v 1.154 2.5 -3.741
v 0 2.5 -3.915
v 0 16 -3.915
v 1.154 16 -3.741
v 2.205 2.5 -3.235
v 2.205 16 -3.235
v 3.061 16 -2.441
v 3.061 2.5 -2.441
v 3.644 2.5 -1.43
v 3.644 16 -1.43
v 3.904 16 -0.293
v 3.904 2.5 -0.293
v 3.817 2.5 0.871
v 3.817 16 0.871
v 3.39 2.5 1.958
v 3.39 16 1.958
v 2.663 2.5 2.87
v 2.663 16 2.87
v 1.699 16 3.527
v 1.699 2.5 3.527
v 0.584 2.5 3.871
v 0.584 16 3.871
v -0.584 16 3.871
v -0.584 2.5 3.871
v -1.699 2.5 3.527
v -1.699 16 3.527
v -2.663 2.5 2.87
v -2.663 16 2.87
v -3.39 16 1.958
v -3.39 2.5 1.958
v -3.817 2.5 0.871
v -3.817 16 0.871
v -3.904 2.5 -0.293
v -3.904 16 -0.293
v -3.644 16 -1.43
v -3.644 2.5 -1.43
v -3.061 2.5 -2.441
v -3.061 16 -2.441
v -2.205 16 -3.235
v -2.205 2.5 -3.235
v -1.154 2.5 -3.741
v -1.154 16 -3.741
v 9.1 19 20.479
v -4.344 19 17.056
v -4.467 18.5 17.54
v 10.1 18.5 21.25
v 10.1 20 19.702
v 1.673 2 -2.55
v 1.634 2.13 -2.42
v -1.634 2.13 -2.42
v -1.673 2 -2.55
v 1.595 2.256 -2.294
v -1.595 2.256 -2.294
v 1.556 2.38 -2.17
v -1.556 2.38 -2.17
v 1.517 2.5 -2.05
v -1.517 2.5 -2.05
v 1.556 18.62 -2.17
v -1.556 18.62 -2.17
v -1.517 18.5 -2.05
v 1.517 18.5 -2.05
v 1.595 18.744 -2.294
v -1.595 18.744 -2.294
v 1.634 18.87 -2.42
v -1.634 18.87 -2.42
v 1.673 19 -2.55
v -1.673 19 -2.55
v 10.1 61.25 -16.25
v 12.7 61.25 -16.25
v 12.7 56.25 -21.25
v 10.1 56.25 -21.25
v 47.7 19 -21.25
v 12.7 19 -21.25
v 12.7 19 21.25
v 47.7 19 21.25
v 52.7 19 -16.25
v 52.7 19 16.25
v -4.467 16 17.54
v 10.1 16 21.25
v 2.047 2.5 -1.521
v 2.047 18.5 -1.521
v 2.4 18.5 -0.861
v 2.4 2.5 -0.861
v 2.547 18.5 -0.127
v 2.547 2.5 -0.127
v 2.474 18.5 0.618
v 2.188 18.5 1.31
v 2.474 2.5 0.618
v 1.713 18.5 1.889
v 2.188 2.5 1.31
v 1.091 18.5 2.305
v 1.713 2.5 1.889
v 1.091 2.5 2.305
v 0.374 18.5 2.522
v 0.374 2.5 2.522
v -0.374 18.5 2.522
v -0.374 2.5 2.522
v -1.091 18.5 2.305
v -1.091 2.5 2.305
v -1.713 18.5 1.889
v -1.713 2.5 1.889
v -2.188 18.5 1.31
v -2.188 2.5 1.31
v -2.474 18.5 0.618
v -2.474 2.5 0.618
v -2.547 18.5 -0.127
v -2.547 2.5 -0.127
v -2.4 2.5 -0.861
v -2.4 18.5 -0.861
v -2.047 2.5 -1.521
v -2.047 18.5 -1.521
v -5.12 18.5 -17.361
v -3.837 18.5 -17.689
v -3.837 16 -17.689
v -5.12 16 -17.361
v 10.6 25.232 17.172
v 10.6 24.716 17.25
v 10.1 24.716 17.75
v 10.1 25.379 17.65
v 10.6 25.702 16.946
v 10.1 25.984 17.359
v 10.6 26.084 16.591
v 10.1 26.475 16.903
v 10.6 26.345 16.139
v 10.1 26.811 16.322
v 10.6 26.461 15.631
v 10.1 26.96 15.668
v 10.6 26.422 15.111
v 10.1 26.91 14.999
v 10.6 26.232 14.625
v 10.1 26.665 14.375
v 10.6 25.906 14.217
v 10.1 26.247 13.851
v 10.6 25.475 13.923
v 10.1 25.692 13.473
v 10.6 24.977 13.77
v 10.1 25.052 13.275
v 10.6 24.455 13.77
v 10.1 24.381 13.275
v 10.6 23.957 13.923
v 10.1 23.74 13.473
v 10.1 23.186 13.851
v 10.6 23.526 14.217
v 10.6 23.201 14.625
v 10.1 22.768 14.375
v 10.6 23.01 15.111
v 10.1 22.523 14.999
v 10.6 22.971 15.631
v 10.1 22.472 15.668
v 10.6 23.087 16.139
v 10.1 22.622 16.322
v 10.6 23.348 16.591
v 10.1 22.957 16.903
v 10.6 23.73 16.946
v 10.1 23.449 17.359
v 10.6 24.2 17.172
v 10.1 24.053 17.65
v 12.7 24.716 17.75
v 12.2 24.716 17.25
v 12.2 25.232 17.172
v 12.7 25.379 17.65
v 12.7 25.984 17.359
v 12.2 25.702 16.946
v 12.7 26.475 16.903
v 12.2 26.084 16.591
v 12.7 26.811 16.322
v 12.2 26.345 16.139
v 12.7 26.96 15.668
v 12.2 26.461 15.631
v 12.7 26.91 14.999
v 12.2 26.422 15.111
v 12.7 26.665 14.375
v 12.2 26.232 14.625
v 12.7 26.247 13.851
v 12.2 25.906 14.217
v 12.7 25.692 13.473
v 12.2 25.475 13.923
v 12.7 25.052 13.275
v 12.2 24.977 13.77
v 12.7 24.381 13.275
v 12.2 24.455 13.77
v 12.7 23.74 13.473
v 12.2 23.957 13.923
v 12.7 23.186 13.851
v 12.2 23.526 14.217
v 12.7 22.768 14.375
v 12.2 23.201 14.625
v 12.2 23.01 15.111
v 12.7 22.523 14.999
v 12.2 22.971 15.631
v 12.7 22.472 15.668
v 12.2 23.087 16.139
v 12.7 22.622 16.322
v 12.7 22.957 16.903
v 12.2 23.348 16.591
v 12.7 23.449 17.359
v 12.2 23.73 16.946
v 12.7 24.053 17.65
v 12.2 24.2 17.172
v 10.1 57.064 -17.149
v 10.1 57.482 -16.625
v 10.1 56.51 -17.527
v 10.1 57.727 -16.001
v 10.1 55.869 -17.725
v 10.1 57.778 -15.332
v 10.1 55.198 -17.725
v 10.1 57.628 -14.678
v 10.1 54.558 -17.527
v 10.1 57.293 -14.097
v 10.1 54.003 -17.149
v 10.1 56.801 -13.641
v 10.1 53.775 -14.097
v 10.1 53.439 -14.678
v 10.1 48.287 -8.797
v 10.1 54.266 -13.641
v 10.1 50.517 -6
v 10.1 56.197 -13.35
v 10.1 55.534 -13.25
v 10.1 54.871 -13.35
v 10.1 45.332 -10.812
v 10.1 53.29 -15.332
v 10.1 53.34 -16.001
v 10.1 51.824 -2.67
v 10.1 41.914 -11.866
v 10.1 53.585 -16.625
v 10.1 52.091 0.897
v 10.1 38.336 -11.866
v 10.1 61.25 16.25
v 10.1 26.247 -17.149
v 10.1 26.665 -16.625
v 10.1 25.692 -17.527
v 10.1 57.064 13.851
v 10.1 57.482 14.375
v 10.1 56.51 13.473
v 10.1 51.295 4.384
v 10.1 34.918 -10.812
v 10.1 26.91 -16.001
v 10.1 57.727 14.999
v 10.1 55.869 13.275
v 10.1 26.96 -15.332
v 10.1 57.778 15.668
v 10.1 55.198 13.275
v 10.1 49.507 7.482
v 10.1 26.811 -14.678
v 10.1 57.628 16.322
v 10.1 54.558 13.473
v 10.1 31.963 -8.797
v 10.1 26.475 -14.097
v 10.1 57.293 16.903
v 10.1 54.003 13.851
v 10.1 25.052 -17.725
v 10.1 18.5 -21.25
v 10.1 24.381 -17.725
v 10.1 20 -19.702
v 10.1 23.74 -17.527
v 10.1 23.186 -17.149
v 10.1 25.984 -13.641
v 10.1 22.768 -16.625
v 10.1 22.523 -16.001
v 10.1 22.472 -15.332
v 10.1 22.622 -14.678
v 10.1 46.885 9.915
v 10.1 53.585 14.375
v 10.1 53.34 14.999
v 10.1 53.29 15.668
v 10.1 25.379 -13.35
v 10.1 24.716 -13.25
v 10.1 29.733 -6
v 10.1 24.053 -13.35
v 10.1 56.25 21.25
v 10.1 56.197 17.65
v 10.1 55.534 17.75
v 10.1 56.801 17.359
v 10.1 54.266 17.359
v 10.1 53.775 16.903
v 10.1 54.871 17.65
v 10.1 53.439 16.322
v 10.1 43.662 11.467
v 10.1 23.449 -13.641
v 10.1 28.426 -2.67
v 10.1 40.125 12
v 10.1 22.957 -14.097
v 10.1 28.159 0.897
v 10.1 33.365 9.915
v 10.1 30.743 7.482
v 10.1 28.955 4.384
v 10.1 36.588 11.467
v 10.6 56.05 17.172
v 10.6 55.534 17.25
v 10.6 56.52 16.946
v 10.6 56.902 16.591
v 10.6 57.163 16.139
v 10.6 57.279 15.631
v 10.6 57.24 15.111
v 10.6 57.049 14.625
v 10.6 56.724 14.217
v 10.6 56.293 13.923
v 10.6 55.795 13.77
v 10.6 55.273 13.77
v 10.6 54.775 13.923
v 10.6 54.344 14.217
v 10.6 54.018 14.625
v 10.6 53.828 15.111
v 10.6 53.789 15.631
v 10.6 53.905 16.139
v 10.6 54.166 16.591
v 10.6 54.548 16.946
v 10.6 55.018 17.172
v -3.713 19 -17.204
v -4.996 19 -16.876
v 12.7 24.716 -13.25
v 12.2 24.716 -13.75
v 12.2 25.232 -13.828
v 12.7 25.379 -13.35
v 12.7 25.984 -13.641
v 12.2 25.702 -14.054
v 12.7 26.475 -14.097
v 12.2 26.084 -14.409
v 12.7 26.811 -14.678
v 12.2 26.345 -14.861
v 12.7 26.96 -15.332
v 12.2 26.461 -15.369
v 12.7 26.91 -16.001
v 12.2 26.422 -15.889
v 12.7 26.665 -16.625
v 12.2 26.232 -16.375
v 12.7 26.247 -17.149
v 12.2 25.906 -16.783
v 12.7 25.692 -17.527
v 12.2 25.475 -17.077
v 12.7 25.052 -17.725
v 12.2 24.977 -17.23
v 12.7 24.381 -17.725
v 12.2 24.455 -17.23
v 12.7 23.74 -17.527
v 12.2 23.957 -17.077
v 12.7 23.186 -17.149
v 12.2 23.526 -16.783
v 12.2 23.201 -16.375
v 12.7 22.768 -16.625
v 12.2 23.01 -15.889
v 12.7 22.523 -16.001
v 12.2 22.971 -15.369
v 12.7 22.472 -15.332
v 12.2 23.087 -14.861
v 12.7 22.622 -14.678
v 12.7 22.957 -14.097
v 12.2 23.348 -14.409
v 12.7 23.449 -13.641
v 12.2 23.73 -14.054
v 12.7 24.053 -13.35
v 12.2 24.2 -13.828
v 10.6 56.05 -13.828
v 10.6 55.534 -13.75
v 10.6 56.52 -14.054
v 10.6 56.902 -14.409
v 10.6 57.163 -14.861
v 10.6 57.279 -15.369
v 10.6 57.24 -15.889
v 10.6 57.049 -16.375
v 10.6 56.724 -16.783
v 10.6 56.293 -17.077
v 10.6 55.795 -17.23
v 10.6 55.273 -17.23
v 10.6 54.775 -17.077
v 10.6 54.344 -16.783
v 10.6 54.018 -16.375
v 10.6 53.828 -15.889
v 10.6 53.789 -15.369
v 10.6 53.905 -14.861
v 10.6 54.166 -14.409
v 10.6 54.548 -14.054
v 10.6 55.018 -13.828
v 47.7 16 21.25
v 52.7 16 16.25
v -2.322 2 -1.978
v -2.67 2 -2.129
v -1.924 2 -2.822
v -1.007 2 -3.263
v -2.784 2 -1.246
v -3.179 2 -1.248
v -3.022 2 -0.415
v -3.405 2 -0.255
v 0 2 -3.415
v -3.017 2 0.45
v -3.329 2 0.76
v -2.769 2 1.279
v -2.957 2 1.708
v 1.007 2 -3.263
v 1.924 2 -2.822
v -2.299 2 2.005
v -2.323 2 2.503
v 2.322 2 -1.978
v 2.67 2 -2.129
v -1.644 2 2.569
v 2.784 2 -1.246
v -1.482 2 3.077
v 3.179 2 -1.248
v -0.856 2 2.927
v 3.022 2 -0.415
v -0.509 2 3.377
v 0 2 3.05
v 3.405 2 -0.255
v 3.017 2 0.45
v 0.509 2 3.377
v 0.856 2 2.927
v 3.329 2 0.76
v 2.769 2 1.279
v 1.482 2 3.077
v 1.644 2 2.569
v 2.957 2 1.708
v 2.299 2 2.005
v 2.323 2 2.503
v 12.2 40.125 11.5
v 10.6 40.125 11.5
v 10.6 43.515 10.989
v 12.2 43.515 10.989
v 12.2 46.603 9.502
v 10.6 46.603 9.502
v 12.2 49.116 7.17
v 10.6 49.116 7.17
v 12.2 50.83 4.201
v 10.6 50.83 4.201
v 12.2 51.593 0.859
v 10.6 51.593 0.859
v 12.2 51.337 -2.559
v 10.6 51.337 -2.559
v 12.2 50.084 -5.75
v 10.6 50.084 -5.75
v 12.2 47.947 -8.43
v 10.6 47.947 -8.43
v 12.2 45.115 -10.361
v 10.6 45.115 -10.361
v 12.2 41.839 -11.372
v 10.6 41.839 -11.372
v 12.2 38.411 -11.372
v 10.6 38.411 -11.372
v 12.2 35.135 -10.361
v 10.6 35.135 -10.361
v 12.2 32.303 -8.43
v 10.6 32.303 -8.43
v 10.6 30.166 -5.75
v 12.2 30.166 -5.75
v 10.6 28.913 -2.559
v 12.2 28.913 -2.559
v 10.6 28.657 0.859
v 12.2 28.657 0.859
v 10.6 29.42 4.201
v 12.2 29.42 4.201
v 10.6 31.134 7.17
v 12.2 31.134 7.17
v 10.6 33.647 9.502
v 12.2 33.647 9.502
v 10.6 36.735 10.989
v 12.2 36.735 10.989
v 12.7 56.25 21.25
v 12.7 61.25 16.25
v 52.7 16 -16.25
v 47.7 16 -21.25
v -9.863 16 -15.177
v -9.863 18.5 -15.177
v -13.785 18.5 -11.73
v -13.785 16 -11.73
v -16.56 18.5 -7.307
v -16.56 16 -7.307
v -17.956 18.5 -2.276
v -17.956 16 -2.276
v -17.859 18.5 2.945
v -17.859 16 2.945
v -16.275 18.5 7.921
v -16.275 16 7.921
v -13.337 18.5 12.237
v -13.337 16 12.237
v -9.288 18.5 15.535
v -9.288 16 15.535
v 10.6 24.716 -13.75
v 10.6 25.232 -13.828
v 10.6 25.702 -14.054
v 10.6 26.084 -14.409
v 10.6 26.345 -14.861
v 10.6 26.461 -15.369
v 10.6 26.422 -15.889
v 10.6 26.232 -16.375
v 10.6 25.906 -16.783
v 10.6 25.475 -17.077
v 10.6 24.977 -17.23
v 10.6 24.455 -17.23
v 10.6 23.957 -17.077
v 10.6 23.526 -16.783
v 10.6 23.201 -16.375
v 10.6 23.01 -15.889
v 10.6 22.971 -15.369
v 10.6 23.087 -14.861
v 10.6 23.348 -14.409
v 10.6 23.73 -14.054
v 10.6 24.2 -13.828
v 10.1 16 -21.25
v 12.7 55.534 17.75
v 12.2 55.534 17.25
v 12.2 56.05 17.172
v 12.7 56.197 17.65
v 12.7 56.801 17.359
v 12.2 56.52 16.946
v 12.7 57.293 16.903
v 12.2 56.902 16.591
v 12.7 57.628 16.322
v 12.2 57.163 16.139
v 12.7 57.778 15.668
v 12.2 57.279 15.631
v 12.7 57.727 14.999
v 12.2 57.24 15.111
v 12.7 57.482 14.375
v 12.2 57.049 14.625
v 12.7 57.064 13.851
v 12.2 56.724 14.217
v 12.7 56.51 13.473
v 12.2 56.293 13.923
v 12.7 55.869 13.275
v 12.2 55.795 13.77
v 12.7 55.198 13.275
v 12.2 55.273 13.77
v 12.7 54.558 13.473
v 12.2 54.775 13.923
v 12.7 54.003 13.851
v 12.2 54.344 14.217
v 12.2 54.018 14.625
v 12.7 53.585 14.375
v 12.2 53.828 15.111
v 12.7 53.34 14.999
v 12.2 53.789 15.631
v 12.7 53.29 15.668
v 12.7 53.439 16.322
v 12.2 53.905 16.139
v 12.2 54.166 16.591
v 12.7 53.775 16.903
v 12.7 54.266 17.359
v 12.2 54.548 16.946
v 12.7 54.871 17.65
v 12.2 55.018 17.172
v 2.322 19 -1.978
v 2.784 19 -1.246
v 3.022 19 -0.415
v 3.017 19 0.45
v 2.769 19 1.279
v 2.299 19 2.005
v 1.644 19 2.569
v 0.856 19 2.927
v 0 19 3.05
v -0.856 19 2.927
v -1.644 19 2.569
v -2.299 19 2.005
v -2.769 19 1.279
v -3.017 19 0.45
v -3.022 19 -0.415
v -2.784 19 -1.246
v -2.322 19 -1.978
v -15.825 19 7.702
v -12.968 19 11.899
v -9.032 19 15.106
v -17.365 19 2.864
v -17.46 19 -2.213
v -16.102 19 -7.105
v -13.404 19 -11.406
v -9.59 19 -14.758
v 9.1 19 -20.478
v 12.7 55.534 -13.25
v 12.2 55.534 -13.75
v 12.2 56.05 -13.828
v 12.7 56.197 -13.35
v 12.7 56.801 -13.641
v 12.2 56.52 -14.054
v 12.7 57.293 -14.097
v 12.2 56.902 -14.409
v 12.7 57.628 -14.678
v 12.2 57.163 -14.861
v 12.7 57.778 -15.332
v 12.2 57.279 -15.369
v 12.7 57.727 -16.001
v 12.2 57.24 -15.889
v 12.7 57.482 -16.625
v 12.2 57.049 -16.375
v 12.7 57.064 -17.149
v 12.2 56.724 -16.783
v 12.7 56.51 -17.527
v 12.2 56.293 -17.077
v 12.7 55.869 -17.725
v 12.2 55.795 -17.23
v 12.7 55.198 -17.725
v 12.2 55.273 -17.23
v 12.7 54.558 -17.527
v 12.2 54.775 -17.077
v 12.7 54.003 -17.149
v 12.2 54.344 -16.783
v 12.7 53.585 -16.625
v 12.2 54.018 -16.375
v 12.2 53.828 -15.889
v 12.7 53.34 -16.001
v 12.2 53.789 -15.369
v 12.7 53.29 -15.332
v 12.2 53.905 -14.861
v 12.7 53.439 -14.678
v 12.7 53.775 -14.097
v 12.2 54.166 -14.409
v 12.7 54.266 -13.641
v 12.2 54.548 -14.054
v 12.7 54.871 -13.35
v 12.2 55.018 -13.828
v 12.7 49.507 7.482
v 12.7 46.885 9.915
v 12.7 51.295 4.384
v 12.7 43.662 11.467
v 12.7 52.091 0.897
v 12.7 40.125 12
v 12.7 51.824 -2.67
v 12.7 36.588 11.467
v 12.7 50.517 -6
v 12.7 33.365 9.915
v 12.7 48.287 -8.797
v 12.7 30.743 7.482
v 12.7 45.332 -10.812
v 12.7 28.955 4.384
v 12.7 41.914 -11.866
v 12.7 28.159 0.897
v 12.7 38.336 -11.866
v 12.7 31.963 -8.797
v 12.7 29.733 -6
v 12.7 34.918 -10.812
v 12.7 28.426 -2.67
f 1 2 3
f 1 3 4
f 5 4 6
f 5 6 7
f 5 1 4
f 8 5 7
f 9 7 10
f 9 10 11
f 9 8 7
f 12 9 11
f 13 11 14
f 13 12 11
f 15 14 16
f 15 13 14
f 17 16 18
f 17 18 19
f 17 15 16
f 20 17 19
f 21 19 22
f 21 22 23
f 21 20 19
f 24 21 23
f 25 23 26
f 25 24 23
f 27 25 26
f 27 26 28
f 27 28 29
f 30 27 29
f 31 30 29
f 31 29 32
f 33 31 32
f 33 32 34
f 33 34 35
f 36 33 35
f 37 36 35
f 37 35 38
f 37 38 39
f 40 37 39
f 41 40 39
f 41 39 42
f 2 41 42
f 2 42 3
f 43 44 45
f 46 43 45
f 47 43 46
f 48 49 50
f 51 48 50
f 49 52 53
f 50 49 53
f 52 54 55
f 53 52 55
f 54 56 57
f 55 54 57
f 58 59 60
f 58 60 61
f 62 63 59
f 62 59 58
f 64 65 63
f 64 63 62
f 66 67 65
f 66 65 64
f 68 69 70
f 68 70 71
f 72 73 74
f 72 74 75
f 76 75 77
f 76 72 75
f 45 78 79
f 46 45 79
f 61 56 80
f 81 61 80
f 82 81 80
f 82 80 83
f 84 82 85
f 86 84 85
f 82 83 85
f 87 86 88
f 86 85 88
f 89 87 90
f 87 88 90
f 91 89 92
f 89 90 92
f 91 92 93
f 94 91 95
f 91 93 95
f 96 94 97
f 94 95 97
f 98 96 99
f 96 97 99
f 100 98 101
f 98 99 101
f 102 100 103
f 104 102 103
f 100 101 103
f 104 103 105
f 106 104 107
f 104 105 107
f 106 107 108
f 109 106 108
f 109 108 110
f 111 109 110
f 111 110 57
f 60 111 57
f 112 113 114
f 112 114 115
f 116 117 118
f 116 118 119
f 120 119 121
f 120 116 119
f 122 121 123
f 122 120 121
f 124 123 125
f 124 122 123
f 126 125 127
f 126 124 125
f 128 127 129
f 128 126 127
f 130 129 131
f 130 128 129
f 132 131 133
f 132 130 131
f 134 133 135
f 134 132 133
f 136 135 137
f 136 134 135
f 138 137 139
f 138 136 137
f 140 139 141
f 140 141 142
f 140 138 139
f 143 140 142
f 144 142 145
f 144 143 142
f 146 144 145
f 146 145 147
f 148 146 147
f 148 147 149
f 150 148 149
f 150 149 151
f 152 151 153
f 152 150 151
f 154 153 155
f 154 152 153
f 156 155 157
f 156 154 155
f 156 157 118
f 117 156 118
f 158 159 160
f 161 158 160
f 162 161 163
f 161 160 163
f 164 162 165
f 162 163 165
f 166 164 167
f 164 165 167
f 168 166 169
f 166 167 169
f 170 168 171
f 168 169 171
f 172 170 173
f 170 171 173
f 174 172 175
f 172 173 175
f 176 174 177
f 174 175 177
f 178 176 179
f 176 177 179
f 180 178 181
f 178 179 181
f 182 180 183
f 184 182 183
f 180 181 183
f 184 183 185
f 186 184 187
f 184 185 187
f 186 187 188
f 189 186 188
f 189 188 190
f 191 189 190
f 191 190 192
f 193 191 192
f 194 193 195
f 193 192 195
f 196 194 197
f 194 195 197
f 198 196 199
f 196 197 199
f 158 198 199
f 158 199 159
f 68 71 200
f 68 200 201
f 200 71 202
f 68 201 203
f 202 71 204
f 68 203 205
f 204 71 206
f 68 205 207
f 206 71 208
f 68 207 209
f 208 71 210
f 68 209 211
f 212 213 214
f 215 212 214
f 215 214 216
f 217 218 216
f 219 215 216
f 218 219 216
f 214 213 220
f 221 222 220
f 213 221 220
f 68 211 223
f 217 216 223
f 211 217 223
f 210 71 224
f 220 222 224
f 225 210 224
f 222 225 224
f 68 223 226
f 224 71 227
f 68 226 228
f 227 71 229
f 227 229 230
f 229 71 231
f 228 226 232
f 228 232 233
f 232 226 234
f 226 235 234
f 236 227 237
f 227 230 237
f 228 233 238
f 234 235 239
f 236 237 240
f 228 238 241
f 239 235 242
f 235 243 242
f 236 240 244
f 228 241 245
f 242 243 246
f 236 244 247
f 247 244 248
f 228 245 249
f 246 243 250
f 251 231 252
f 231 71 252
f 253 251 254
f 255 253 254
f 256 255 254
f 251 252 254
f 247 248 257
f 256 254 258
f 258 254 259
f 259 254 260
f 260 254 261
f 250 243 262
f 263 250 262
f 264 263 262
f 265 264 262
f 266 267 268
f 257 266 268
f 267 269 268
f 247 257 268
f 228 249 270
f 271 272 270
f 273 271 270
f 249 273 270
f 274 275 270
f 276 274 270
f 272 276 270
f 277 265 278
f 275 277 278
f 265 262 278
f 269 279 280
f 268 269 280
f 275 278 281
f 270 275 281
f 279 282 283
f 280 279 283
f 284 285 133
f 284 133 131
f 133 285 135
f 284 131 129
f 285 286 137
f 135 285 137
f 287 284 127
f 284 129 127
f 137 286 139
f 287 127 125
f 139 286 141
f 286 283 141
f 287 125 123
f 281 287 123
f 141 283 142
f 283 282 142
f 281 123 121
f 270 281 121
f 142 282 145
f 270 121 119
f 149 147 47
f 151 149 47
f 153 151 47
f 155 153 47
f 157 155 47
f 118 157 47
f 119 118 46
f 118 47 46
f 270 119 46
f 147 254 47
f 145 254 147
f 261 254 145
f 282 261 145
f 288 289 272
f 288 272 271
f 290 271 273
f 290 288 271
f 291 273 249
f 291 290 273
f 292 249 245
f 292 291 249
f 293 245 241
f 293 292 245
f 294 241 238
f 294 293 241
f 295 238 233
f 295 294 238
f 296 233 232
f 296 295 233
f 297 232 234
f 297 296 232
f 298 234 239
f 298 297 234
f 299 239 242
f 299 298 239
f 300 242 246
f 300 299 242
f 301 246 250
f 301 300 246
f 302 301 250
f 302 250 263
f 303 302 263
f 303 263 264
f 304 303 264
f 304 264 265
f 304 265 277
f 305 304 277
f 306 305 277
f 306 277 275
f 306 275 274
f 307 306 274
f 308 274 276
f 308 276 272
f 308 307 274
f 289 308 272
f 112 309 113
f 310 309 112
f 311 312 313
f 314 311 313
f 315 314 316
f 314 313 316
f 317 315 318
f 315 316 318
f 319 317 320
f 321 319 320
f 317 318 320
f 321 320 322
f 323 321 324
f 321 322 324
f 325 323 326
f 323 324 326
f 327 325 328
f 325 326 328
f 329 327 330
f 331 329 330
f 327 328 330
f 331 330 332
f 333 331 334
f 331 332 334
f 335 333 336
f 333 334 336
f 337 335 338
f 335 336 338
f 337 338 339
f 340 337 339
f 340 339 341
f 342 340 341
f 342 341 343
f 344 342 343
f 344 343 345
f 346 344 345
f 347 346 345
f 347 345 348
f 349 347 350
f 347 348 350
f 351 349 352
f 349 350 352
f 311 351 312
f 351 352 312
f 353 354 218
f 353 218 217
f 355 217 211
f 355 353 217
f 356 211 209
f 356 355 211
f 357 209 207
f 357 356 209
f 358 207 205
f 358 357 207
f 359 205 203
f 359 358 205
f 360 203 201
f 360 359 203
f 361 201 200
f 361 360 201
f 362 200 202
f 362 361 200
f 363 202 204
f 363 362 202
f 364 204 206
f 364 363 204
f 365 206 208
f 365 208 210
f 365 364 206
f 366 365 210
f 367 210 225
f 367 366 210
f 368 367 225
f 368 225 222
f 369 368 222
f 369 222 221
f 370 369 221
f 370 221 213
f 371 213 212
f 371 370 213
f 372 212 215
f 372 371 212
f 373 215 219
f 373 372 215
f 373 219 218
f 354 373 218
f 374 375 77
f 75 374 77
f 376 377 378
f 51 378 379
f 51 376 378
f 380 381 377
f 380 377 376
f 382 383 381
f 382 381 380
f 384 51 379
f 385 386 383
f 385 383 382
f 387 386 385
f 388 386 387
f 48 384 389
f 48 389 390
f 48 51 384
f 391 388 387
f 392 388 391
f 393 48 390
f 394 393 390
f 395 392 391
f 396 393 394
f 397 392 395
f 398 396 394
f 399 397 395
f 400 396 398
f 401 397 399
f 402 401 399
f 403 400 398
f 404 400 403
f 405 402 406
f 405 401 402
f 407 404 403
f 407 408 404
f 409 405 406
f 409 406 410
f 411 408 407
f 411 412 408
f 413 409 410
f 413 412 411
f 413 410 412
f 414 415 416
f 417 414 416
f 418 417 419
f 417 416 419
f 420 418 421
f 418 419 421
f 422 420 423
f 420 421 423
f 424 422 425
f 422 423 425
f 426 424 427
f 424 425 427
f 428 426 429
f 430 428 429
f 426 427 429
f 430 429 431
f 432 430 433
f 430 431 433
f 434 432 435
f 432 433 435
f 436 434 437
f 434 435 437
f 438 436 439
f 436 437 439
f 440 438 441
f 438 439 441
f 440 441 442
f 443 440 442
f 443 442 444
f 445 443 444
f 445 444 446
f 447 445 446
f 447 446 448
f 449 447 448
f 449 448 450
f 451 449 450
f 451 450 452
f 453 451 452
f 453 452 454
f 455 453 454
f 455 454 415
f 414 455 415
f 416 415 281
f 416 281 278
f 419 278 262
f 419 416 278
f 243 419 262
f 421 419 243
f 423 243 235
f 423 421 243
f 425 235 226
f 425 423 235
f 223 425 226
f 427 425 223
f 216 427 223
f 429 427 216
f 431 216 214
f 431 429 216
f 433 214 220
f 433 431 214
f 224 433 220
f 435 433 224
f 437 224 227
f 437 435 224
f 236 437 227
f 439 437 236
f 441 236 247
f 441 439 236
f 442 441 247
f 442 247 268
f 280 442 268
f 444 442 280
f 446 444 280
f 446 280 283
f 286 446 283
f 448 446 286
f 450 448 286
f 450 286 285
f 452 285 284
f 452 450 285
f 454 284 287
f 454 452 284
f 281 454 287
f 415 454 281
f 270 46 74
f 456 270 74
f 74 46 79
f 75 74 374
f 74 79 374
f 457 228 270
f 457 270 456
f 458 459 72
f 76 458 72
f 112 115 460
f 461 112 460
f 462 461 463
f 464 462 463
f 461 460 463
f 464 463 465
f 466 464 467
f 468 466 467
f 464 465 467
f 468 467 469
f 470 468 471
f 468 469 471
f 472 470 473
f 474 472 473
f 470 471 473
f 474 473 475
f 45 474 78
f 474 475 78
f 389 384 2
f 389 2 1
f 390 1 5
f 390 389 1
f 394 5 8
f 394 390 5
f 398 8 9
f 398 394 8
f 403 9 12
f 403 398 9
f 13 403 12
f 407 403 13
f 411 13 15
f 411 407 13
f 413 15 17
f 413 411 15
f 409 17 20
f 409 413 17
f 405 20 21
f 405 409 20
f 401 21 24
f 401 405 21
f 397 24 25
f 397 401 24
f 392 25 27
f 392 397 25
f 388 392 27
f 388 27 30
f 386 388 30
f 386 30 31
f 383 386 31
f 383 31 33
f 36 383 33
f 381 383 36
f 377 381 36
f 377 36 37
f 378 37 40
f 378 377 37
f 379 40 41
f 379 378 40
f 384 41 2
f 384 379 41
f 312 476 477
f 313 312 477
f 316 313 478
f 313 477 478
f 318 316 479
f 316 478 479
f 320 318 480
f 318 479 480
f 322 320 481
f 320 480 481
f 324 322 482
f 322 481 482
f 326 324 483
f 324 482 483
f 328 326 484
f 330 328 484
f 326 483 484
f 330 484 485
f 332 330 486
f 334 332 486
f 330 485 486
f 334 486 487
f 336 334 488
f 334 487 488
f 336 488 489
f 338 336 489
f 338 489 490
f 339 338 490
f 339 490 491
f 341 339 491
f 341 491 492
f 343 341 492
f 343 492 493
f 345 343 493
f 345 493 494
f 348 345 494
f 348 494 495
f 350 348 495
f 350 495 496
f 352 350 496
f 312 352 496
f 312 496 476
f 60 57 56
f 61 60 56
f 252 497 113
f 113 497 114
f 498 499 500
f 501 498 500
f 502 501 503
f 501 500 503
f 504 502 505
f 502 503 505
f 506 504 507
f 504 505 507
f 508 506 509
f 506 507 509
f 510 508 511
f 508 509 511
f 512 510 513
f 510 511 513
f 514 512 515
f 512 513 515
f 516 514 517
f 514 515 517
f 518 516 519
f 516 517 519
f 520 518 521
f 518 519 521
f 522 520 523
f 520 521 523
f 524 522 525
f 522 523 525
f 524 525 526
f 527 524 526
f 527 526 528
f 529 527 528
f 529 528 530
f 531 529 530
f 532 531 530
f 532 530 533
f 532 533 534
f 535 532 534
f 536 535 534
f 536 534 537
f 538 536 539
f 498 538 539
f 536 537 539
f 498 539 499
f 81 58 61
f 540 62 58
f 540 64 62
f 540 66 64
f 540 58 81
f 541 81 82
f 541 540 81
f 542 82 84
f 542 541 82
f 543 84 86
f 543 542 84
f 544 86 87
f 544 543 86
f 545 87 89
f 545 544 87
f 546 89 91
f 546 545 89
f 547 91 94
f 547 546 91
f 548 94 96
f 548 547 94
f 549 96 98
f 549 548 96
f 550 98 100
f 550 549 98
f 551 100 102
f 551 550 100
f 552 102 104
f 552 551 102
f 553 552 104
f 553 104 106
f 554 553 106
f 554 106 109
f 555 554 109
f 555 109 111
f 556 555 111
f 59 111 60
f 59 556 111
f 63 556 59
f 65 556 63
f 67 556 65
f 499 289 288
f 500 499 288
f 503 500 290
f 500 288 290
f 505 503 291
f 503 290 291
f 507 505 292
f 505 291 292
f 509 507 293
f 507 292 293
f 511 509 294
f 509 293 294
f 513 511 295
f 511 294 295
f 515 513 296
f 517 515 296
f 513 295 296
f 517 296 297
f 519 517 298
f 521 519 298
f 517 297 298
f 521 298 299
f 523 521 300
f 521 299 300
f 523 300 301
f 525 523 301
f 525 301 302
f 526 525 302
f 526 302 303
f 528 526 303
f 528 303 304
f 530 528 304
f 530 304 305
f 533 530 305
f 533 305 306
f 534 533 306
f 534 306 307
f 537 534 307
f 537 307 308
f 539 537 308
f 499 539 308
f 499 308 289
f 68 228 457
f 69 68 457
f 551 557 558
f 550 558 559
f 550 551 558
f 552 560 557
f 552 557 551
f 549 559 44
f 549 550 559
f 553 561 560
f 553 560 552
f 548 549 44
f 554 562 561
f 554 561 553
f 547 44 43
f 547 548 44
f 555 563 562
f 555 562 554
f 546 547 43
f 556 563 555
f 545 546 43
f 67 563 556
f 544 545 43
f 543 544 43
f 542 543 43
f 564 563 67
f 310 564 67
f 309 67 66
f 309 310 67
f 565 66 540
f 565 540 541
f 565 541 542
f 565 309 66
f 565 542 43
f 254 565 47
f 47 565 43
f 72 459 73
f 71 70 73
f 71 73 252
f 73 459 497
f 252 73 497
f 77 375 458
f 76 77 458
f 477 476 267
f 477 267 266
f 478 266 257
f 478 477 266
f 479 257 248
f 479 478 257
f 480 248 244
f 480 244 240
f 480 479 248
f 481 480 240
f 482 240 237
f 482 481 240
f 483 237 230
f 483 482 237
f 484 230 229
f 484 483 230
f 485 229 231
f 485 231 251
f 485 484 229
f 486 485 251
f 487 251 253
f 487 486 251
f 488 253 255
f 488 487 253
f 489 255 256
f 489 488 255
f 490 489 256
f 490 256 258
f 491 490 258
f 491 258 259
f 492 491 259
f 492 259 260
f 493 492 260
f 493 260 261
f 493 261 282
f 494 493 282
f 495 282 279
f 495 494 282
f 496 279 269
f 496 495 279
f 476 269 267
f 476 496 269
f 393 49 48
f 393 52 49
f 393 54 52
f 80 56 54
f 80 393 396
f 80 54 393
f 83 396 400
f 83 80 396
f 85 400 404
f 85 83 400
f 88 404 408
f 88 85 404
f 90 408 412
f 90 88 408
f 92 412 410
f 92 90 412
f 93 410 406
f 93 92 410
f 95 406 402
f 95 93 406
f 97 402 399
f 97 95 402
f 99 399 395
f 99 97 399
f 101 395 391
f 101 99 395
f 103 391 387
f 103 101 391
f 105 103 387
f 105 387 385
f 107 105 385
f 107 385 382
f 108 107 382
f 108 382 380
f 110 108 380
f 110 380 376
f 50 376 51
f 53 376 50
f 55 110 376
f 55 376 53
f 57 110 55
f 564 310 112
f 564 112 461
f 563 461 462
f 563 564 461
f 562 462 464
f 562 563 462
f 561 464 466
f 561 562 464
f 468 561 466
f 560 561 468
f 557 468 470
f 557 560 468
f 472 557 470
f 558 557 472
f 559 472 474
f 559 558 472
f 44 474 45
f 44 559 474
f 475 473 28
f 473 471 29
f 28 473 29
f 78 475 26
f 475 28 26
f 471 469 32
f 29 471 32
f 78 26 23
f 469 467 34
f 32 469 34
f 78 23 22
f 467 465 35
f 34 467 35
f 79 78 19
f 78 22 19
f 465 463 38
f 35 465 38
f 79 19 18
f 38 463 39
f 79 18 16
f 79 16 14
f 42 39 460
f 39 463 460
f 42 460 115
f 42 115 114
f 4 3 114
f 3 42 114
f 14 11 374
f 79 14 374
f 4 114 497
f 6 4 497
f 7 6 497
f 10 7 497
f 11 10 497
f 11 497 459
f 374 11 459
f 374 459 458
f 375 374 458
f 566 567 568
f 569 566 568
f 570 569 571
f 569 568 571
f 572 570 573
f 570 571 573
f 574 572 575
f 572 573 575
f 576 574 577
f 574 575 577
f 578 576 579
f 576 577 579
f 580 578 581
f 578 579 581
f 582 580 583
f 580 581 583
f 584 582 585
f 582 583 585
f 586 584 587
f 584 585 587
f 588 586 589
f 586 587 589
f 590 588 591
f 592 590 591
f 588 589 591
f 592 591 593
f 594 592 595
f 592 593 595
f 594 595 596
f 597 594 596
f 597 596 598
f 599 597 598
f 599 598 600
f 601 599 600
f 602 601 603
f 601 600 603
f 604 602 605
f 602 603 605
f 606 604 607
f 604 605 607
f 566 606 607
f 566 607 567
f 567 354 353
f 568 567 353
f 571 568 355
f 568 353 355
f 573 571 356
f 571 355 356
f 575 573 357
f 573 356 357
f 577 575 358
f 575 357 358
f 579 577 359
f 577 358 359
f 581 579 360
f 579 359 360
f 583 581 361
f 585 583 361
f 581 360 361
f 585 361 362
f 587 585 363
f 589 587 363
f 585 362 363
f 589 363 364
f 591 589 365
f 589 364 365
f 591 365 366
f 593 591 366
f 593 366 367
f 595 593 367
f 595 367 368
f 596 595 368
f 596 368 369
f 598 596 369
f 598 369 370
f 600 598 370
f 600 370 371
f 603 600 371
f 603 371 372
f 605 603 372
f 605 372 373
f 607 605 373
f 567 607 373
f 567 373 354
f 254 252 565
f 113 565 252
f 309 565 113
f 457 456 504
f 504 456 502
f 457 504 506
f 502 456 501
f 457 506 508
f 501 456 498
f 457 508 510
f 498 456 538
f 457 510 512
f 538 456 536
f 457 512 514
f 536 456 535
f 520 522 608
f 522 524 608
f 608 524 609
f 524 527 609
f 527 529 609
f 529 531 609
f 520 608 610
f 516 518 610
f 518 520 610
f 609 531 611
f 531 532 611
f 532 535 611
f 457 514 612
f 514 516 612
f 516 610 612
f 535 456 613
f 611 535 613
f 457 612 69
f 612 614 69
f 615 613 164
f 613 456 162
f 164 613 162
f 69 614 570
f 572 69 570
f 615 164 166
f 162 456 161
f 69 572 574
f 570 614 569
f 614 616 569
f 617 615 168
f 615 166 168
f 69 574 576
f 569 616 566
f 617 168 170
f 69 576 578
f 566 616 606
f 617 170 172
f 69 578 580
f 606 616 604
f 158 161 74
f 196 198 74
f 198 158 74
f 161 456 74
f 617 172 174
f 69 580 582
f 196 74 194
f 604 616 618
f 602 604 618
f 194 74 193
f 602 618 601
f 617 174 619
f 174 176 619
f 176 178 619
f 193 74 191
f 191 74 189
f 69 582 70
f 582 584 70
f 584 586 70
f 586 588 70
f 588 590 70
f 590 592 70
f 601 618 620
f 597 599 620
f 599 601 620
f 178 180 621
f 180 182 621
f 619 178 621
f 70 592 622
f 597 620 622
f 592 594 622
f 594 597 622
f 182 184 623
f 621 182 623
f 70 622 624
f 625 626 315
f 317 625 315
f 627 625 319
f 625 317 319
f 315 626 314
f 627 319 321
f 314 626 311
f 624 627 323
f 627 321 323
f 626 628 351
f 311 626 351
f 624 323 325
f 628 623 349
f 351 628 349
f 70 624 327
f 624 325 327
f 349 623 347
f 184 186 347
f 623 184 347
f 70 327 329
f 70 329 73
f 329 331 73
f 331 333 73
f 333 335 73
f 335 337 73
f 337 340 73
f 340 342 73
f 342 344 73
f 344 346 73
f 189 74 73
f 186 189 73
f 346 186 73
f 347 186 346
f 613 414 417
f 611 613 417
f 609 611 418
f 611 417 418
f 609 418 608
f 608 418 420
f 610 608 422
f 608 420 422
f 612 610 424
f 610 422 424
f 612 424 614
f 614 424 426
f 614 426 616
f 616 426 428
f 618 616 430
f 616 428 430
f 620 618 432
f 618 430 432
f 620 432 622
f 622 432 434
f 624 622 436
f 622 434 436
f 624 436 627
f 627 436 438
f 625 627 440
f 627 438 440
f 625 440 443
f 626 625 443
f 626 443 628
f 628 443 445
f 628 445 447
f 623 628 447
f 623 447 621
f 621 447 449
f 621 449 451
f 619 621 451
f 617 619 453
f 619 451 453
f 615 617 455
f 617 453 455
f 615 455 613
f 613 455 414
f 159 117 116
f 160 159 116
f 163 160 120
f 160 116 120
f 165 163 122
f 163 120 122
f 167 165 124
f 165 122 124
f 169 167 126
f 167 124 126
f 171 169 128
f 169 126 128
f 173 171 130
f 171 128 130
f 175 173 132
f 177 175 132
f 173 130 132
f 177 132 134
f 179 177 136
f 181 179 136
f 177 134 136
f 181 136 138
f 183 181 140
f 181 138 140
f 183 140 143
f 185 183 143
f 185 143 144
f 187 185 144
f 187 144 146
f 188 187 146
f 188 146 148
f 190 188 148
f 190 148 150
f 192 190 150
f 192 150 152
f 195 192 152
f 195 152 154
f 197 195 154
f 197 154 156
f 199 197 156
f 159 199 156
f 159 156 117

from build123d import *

# Parameters (mm, degrees)
SKETCH_1_R          = 3.625
EXTRUDE_1_DEPTH     = 16
EXTRUDE_3_DEPTH     = 3
SKETCH_3_W          = 2.6
SKETCH_3_H          = 42.5
EXTRUDE_4_DEPTH     = 42.25
SKETCH_4_R          = 11.5
SKETCH_4_R_2        = 1.75
CUT_EXTRUDE_1_DEPTH = 42.25
EXTRUDE_5_REACH     = 85.549
SKETCH_5_R          = 3.915
SKETCH_5_R_2        = 3.625
CUT_EXTRUDE_2_REACH = 85.549
CHAMFER_1_SIZE      = 0.5
CHAMFER_2_SIZE      = 1
CHAMFER_3_SIZE      = 5
SKETCH_7_W          = 19.912738871
SKETCH_7_H          = 22.903585025
CUT_EXTRUDE_3_DEPTH = 2
CHAMFER_4_SIZE      = 0.5


with BuildPart() as part:
    # 草图1 → 凸台-拉伸1 (new body)
    with BuildSketch(Plane(origin=(0, 0, 0), x_dir=(1, 0, 0), z_dir=(0, 1, 0))):
        Circle(SKETCH_1_R)
    extrude(amount=EXTRUDE_1_DEPTH)

    # 草图2 → 凸台-拉伸3 (add)
    with BuildSketch(Plane(origin=(0, 16, 0), x_dir=(1, 0, 0), z_dir=(0, 1, 0))):
        with BuildLine():
            Line((10.1, 21.25), (-5.119556865, 17.360879514))
            ThreePointArc((-5.119556865, 17.360879514), (-18.096837592, -0.3383329), (-4.467058756, -17.540107926))
            Line((-4.467058756, -17.540107926), (10.1, -21.25))
            Line((10.1, -21.25), (52.7, -21.25))
            Line((52.7, -21.25), (52.7, 21.25))
            Line((52.7, 21.25), (10.1, 21.25))
        make_face()
    extrude(amount=EXTRUDE_3_DEPTH)

    # 草图3 → 凸台-拉伸4 (add)
    with BuildSketch(Plane(origin=(0, 19, 0), x_dir=(1, 0, 0), z_dir=(0, 1, 0))):
        with Locations((11.4, 0)):
            Rectangle(SKETCH_3_W, SKETCH_3_H)
    extrude(amount=EXTRUDE_4_DEPTH)

    # 草图4 → 切除-拉伸1 (cut)
    with BuildSketch(Plane.ZY.offset(-10.1)):
        with Locations((0, 40.125)):
            Circle(SKETCH_4_R)
        with Locations((-15.5, 55.533823529)):
            Circle(SKETCH_4_R_2)
        with Locations((15.5, 55.533823529)):
            Circle(SKETCH_4_R_2)
        with Locations((15.5, 24.716176471)):
            Circle(SKETCH_4_R_2)
        with Locations((-15.5, 24.716176471)):
            Circle(SKETCH_4_R_2)
    extrude(amount=-CUT_EXTRUDE_1_DEPTH, mode=Mode.SUBTRACT)

    # 草图5 → 凸台-拉伸5 (add, up to next)
    with BuildSketch(Plane.XZ, mode=Mode.PRIVATE) as extrude_5_sk1:
        Circle(SKETCH_5_R)
        Circle(SKETCH_5_R_2, mode=Mode.SUBTRACT)
    extrude_5_tool1 = extrude(extrude_5_sk1.sketch, amount=-EXTRUDE_5_REACH, mode=Mode.PRIVATE) - part.part
    add(extrude_5_tool1.solids().sort_by_distance((-3.804267, 0, 0))[0])

    # 草图6 → 切除-拉伸2 (cut, up to next)
    with BuildSketch(Plane.XZ, mode=Mode.PRIVATE) as cut_extrude_2_sk1:
        with BuildLine():
            Line((-1.516575089, -2.05), (1.516575089, -2.05))
            ThreePointArc((1.516575089, -2.05), (0, 2.55), (-1.516575089, -2.05))
        make_face()
    cut_extrude_2_tool1 = extrude(cut_extrude_2_sk1.sketch, amount=-CUT_EXTRUDE_2_REACH, mode=Mode.PRIVATE) & part.part
    add(cut_extrude_2_tool1.solids().sort_by_distance((0, 0, 0.119895))[0], mode=Mode.SUBTRACT)

    # 倒角1
    chamfer_1_edges = [part.edges().sort_by_distance(p)[0] for p in [
        (12.7, 24.716176471, 13.75),
        (10.1, 24.716176471, 13.75),
        (12.7, 55.533823529, 13.75),
        (10.1, 55.533823529, 13.75),
        (12.7, 55.533823529, -17.25),
        (10.1, 55.533823529, -17.25),
        (12.7, 40.125, -11.5),
        (10.1, 40.125, -11.5),
        (12.7, 24.716176471, -17.25),
        (10.1, 24.716176471, -17.25),
        (-3.915, 0, 0),
        (0, 0, -2.05),
        (0, 0, 2.55),
        (0, 19, 2.55),
        (0, 19, -2.05),
        (2.816470622, 19, 19.395053963),
        (-18.096837592, 19, 0.3383329),
        (2.490221568, 19, -19.305439757),
    ]]
    chamfer(chamfer_1_edges, length=CHAMFER_1_SIZE)

    # 倒角2
    chamfer_2_edges = [part.edges().sort_by_distance(p)[0] for p in [
        (10.1, 19, 5.2997e-05),
    ]]
    chamfer(chamfer_2_edges, length=CHAMFER_2_SIZE)

    # 倒角3
    chamfer_3_edges = [part.edges().sort_by_distance(p)[0] for p in [
        (11.4, 61.25, 21.25),
        (11.4, 61.25, -21.25),
        (52.7, 17.5, 21.25),
        (52.7, 17.5, -21.25),
    ]]
    chamfer(chamfer_3_edges, length=CHAMFER_3_SIZE)

    # 草图7 → 切除-拉伸3 (cut)
    with BuildSketch(Plane.XZ):
        with Locations((2.581888661, -2.951492916)):
            Rectangle(SKETCH_7_W, SKETCH_7_H)
    extrude(amount=-CUT_EXTRUDE_3_DEPTH, mode=Mode.SUBTRACT)

    # 倒角4
    chamfer_4_edges = [part.edges().sort_by_distance(p)[0] for p in [
        (0, 2, 2.55),
        (0, 2, -2.05),
        (-3.915, 2, 0),
    ]]
    chamfer(chamfer_4_edges, length=CHAMFER_4_SIZE)


solid = part.part
